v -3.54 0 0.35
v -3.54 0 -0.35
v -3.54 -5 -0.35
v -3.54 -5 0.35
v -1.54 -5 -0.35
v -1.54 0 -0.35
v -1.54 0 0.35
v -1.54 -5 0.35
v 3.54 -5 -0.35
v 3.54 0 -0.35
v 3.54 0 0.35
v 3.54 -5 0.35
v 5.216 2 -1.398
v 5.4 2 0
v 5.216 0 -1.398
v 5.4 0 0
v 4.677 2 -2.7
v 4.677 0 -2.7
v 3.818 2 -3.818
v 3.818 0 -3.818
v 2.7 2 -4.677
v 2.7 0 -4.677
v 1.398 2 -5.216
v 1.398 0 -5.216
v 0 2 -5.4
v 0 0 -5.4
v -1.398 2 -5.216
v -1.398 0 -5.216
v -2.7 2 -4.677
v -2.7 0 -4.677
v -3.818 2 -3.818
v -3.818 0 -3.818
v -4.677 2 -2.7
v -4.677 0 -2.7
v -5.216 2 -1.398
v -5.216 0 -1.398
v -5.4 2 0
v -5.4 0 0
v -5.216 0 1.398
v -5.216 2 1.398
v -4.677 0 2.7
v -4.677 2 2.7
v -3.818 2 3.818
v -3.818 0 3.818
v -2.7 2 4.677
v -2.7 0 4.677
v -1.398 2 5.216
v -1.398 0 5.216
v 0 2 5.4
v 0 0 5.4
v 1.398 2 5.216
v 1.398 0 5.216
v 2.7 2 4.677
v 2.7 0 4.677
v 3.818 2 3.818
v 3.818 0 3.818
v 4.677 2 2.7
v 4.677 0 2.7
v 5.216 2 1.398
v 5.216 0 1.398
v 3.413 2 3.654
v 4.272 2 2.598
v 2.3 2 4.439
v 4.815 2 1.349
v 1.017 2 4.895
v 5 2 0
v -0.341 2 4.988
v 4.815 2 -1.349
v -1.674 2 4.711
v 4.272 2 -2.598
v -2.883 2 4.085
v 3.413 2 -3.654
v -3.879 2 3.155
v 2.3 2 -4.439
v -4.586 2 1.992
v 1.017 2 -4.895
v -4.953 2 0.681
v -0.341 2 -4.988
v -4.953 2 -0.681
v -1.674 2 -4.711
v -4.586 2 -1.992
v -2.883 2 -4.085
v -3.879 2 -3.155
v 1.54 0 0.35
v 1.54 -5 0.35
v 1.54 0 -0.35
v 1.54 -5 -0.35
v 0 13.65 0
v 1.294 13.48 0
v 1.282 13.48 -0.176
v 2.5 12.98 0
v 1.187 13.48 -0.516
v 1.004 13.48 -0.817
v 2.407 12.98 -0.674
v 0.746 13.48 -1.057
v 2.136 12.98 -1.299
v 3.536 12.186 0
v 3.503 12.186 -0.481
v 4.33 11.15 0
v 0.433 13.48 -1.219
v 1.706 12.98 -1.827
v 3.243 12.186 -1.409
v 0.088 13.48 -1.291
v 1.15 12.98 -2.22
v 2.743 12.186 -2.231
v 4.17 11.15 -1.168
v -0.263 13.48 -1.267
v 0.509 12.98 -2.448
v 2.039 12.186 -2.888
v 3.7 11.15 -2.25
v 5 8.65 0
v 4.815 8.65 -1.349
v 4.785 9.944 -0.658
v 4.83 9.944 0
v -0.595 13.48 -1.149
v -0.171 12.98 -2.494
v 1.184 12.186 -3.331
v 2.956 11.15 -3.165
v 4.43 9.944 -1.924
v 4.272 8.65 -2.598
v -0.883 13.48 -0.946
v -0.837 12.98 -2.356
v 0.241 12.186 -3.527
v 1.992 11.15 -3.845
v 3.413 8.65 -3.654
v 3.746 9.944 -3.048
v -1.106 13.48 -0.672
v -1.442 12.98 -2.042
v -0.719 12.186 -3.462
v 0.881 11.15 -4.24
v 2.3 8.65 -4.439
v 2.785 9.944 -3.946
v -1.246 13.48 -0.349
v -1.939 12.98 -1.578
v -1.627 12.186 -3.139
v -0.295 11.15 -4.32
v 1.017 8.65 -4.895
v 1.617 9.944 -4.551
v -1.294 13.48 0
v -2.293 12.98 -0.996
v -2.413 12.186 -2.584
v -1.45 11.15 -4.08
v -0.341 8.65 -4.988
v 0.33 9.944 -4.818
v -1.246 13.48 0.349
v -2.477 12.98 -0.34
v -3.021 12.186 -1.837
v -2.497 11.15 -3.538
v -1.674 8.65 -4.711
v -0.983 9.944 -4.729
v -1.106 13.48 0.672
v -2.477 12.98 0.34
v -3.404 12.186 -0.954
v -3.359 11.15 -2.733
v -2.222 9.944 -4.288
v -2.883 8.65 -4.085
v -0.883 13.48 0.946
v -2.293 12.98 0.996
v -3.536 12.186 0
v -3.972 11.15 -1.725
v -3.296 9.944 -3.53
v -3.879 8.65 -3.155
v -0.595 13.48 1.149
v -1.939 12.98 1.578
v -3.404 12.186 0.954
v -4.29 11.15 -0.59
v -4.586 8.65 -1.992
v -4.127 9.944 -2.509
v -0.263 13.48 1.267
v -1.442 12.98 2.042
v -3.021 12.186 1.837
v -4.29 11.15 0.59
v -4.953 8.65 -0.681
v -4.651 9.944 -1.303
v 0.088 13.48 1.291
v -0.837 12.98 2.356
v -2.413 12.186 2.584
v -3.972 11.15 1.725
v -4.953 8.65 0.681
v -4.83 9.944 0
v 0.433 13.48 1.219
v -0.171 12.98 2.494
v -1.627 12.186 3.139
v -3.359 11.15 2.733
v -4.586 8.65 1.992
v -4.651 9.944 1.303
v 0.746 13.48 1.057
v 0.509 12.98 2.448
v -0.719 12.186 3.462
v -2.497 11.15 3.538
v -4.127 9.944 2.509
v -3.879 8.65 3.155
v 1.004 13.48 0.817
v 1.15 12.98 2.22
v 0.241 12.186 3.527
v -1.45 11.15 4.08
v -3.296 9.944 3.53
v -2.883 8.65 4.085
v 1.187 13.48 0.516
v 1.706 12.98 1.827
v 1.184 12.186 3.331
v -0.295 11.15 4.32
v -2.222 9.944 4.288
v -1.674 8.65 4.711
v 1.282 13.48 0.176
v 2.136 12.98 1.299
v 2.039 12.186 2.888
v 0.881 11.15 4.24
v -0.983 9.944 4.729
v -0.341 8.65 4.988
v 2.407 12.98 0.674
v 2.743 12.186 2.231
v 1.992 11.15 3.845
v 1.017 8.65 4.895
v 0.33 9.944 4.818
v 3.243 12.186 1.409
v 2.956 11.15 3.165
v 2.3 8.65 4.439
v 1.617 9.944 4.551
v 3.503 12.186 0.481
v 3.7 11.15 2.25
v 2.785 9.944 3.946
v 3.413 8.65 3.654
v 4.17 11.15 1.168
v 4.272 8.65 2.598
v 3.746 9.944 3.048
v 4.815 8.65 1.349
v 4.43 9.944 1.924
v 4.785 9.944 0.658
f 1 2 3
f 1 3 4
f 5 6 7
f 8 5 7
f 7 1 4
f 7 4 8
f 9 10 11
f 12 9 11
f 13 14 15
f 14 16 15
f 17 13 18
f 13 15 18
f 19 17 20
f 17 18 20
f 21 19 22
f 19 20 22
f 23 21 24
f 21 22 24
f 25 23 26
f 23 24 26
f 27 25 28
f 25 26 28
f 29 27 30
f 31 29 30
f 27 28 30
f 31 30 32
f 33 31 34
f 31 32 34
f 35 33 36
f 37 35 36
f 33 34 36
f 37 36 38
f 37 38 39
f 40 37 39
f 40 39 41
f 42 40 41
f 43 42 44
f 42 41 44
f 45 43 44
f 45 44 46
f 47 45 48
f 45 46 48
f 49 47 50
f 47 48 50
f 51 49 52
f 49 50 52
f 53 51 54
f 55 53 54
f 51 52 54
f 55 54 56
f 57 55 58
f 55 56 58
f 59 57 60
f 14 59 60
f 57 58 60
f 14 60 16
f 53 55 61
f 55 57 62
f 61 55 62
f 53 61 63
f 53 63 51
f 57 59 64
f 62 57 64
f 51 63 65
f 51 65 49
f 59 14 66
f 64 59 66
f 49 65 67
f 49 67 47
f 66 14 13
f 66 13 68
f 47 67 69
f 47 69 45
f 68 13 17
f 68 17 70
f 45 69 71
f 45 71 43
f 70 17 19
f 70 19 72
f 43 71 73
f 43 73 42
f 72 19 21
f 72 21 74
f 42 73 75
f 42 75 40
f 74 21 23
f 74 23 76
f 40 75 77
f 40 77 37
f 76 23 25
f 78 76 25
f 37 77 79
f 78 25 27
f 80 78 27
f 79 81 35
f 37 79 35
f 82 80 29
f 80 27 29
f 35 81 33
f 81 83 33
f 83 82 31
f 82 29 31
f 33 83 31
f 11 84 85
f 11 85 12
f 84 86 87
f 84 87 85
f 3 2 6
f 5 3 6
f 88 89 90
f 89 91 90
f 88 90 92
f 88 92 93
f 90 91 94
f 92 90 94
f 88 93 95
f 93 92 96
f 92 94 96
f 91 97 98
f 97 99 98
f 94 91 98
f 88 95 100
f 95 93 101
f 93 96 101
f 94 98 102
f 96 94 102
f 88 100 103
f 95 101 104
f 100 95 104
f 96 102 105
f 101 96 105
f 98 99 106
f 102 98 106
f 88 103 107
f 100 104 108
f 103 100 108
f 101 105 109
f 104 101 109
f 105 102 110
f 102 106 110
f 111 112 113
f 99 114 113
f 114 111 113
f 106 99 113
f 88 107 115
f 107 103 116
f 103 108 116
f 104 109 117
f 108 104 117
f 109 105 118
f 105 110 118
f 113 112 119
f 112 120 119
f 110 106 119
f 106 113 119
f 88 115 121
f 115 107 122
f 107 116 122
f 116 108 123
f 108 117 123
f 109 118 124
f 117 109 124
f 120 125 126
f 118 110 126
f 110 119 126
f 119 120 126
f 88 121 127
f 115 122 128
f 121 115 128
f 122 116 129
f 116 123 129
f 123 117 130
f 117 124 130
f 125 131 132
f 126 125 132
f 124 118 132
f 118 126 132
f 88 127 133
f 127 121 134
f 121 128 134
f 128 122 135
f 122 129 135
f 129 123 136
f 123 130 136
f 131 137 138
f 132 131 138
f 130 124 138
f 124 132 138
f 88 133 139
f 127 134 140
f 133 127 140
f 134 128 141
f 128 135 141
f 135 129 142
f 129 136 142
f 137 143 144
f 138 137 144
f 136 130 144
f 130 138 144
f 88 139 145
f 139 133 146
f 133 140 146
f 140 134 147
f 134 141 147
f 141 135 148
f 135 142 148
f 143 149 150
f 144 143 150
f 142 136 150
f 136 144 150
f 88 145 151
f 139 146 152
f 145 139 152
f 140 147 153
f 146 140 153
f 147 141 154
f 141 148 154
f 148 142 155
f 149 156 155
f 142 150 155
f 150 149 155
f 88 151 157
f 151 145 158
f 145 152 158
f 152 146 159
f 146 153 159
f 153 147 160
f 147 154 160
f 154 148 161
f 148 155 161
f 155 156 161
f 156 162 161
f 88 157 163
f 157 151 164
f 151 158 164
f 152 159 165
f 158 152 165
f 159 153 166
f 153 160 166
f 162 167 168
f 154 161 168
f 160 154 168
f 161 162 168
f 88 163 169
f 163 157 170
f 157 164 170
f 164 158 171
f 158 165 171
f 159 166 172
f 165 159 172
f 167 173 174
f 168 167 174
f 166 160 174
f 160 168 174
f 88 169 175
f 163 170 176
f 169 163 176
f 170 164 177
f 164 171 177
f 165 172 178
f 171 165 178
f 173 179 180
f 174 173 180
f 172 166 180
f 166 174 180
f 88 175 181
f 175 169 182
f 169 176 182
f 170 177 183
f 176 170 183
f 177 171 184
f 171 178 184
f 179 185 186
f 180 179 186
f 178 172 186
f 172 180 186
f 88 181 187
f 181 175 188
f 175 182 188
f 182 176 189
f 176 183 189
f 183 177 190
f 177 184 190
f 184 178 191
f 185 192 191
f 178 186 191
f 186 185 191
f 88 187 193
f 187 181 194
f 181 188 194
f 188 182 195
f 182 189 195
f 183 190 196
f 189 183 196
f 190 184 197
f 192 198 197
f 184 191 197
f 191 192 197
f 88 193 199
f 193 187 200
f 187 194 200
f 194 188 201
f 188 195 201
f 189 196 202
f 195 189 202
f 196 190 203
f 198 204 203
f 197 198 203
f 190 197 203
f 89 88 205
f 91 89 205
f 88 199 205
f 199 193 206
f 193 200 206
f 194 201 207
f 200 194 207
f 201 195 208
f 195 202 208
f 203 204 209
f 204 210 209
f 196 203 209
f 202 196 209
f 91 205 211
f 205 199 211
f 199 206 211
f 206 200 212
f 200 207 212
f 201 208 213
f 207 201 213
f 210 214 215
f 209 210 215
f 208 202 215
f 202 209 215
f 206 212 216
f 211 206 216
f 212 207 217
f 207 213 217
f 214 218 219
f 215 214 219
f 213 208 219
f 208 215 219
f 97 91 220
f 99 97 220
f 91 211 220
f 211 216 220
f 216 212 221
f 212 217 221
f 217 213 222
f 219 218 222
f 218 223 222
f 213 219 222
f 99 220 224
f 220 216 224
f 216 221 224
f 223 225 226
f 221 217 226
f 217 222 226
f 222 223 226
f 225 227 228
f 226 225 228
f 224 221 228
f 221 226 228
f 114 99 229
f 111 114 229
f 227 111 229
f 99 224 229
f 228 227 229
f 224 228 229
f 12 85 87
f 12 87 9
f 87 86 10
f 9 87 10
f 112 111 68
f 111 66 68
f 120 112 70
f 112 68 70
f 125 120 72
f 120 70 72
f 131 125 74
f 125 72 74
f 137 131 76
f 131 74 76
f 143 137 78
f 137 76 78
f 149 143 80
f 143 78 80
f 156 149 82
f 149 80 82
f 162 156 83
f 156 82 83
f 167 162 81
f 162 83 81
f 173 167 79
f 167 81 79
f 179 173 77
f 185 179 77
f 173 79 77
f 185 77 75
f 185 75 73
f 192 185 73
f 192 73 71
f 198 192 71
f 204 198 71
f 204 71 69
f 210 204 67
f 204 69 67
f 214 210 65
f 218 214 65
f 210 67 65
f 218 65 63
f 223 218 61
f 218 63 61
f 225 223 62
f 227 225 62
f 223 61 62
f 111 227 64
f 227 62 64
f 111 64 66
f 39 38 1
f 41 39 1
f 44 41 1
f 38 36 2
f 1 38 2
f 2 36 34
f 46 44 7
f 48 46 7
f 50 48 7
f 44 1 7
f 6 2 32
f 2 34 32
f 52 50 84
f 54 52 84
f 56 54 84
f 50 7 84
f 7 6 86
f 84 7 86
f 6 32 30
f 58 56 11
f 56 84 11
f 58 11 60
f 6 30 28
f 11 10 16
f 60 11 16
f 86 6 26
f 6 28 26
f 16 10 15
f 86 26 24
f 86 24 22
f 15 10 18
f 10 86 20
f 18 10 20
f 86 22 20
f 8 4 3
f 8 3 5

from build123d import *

# Parameters (mm, degrees)
SKETCH2_W                = 2
SKETCH2_H                = 0.7
BOSS_EXTRUDE1_DEPTH      = 5
BOSS_EXTRUDE1_DEPTH_BACK = 5


with BuildPart() as part:
    # Sketch1 → Revolve1 (revolve)
    with BuildSketch(Plane.XY):
        with BuildLine():
            Line((0, 0), (0, 13.65))
            ThreePointArc((0, 13.65), (3.535533906, 12.185533906), (5, 8.65))
            Line((5, 8.65), (5, 2))
            Line((5, 2), (5.4, 2))
            Line((5.4, 2), (5.4, 0))
            Line((5.4, 0), (0, 0))
        make_face()
    revolve(axis=Axis((0, 0, 0), (0, 1, 0)))

    # Sketch2 → Boss-Extrude1 (add, two sides)
    with BuildSketch(Plane.XZ) as boss_extrude1_sk:
        with Locations((2.54, 0)):
            Rectangle(SKETCH2_W, SKETCH2_H)
        with Locations((-2.54, 0)):
            Rectangle(SKETCH2_W, SKETCH2_H)
    extrude(amount=BOSS_EXTRUDE1_DEPTH)
    extrude(boss_extrude1_sk.sketch, amount=-BOSS_EXTRUDE1_DEPTH_BACK)


solid = part.part
